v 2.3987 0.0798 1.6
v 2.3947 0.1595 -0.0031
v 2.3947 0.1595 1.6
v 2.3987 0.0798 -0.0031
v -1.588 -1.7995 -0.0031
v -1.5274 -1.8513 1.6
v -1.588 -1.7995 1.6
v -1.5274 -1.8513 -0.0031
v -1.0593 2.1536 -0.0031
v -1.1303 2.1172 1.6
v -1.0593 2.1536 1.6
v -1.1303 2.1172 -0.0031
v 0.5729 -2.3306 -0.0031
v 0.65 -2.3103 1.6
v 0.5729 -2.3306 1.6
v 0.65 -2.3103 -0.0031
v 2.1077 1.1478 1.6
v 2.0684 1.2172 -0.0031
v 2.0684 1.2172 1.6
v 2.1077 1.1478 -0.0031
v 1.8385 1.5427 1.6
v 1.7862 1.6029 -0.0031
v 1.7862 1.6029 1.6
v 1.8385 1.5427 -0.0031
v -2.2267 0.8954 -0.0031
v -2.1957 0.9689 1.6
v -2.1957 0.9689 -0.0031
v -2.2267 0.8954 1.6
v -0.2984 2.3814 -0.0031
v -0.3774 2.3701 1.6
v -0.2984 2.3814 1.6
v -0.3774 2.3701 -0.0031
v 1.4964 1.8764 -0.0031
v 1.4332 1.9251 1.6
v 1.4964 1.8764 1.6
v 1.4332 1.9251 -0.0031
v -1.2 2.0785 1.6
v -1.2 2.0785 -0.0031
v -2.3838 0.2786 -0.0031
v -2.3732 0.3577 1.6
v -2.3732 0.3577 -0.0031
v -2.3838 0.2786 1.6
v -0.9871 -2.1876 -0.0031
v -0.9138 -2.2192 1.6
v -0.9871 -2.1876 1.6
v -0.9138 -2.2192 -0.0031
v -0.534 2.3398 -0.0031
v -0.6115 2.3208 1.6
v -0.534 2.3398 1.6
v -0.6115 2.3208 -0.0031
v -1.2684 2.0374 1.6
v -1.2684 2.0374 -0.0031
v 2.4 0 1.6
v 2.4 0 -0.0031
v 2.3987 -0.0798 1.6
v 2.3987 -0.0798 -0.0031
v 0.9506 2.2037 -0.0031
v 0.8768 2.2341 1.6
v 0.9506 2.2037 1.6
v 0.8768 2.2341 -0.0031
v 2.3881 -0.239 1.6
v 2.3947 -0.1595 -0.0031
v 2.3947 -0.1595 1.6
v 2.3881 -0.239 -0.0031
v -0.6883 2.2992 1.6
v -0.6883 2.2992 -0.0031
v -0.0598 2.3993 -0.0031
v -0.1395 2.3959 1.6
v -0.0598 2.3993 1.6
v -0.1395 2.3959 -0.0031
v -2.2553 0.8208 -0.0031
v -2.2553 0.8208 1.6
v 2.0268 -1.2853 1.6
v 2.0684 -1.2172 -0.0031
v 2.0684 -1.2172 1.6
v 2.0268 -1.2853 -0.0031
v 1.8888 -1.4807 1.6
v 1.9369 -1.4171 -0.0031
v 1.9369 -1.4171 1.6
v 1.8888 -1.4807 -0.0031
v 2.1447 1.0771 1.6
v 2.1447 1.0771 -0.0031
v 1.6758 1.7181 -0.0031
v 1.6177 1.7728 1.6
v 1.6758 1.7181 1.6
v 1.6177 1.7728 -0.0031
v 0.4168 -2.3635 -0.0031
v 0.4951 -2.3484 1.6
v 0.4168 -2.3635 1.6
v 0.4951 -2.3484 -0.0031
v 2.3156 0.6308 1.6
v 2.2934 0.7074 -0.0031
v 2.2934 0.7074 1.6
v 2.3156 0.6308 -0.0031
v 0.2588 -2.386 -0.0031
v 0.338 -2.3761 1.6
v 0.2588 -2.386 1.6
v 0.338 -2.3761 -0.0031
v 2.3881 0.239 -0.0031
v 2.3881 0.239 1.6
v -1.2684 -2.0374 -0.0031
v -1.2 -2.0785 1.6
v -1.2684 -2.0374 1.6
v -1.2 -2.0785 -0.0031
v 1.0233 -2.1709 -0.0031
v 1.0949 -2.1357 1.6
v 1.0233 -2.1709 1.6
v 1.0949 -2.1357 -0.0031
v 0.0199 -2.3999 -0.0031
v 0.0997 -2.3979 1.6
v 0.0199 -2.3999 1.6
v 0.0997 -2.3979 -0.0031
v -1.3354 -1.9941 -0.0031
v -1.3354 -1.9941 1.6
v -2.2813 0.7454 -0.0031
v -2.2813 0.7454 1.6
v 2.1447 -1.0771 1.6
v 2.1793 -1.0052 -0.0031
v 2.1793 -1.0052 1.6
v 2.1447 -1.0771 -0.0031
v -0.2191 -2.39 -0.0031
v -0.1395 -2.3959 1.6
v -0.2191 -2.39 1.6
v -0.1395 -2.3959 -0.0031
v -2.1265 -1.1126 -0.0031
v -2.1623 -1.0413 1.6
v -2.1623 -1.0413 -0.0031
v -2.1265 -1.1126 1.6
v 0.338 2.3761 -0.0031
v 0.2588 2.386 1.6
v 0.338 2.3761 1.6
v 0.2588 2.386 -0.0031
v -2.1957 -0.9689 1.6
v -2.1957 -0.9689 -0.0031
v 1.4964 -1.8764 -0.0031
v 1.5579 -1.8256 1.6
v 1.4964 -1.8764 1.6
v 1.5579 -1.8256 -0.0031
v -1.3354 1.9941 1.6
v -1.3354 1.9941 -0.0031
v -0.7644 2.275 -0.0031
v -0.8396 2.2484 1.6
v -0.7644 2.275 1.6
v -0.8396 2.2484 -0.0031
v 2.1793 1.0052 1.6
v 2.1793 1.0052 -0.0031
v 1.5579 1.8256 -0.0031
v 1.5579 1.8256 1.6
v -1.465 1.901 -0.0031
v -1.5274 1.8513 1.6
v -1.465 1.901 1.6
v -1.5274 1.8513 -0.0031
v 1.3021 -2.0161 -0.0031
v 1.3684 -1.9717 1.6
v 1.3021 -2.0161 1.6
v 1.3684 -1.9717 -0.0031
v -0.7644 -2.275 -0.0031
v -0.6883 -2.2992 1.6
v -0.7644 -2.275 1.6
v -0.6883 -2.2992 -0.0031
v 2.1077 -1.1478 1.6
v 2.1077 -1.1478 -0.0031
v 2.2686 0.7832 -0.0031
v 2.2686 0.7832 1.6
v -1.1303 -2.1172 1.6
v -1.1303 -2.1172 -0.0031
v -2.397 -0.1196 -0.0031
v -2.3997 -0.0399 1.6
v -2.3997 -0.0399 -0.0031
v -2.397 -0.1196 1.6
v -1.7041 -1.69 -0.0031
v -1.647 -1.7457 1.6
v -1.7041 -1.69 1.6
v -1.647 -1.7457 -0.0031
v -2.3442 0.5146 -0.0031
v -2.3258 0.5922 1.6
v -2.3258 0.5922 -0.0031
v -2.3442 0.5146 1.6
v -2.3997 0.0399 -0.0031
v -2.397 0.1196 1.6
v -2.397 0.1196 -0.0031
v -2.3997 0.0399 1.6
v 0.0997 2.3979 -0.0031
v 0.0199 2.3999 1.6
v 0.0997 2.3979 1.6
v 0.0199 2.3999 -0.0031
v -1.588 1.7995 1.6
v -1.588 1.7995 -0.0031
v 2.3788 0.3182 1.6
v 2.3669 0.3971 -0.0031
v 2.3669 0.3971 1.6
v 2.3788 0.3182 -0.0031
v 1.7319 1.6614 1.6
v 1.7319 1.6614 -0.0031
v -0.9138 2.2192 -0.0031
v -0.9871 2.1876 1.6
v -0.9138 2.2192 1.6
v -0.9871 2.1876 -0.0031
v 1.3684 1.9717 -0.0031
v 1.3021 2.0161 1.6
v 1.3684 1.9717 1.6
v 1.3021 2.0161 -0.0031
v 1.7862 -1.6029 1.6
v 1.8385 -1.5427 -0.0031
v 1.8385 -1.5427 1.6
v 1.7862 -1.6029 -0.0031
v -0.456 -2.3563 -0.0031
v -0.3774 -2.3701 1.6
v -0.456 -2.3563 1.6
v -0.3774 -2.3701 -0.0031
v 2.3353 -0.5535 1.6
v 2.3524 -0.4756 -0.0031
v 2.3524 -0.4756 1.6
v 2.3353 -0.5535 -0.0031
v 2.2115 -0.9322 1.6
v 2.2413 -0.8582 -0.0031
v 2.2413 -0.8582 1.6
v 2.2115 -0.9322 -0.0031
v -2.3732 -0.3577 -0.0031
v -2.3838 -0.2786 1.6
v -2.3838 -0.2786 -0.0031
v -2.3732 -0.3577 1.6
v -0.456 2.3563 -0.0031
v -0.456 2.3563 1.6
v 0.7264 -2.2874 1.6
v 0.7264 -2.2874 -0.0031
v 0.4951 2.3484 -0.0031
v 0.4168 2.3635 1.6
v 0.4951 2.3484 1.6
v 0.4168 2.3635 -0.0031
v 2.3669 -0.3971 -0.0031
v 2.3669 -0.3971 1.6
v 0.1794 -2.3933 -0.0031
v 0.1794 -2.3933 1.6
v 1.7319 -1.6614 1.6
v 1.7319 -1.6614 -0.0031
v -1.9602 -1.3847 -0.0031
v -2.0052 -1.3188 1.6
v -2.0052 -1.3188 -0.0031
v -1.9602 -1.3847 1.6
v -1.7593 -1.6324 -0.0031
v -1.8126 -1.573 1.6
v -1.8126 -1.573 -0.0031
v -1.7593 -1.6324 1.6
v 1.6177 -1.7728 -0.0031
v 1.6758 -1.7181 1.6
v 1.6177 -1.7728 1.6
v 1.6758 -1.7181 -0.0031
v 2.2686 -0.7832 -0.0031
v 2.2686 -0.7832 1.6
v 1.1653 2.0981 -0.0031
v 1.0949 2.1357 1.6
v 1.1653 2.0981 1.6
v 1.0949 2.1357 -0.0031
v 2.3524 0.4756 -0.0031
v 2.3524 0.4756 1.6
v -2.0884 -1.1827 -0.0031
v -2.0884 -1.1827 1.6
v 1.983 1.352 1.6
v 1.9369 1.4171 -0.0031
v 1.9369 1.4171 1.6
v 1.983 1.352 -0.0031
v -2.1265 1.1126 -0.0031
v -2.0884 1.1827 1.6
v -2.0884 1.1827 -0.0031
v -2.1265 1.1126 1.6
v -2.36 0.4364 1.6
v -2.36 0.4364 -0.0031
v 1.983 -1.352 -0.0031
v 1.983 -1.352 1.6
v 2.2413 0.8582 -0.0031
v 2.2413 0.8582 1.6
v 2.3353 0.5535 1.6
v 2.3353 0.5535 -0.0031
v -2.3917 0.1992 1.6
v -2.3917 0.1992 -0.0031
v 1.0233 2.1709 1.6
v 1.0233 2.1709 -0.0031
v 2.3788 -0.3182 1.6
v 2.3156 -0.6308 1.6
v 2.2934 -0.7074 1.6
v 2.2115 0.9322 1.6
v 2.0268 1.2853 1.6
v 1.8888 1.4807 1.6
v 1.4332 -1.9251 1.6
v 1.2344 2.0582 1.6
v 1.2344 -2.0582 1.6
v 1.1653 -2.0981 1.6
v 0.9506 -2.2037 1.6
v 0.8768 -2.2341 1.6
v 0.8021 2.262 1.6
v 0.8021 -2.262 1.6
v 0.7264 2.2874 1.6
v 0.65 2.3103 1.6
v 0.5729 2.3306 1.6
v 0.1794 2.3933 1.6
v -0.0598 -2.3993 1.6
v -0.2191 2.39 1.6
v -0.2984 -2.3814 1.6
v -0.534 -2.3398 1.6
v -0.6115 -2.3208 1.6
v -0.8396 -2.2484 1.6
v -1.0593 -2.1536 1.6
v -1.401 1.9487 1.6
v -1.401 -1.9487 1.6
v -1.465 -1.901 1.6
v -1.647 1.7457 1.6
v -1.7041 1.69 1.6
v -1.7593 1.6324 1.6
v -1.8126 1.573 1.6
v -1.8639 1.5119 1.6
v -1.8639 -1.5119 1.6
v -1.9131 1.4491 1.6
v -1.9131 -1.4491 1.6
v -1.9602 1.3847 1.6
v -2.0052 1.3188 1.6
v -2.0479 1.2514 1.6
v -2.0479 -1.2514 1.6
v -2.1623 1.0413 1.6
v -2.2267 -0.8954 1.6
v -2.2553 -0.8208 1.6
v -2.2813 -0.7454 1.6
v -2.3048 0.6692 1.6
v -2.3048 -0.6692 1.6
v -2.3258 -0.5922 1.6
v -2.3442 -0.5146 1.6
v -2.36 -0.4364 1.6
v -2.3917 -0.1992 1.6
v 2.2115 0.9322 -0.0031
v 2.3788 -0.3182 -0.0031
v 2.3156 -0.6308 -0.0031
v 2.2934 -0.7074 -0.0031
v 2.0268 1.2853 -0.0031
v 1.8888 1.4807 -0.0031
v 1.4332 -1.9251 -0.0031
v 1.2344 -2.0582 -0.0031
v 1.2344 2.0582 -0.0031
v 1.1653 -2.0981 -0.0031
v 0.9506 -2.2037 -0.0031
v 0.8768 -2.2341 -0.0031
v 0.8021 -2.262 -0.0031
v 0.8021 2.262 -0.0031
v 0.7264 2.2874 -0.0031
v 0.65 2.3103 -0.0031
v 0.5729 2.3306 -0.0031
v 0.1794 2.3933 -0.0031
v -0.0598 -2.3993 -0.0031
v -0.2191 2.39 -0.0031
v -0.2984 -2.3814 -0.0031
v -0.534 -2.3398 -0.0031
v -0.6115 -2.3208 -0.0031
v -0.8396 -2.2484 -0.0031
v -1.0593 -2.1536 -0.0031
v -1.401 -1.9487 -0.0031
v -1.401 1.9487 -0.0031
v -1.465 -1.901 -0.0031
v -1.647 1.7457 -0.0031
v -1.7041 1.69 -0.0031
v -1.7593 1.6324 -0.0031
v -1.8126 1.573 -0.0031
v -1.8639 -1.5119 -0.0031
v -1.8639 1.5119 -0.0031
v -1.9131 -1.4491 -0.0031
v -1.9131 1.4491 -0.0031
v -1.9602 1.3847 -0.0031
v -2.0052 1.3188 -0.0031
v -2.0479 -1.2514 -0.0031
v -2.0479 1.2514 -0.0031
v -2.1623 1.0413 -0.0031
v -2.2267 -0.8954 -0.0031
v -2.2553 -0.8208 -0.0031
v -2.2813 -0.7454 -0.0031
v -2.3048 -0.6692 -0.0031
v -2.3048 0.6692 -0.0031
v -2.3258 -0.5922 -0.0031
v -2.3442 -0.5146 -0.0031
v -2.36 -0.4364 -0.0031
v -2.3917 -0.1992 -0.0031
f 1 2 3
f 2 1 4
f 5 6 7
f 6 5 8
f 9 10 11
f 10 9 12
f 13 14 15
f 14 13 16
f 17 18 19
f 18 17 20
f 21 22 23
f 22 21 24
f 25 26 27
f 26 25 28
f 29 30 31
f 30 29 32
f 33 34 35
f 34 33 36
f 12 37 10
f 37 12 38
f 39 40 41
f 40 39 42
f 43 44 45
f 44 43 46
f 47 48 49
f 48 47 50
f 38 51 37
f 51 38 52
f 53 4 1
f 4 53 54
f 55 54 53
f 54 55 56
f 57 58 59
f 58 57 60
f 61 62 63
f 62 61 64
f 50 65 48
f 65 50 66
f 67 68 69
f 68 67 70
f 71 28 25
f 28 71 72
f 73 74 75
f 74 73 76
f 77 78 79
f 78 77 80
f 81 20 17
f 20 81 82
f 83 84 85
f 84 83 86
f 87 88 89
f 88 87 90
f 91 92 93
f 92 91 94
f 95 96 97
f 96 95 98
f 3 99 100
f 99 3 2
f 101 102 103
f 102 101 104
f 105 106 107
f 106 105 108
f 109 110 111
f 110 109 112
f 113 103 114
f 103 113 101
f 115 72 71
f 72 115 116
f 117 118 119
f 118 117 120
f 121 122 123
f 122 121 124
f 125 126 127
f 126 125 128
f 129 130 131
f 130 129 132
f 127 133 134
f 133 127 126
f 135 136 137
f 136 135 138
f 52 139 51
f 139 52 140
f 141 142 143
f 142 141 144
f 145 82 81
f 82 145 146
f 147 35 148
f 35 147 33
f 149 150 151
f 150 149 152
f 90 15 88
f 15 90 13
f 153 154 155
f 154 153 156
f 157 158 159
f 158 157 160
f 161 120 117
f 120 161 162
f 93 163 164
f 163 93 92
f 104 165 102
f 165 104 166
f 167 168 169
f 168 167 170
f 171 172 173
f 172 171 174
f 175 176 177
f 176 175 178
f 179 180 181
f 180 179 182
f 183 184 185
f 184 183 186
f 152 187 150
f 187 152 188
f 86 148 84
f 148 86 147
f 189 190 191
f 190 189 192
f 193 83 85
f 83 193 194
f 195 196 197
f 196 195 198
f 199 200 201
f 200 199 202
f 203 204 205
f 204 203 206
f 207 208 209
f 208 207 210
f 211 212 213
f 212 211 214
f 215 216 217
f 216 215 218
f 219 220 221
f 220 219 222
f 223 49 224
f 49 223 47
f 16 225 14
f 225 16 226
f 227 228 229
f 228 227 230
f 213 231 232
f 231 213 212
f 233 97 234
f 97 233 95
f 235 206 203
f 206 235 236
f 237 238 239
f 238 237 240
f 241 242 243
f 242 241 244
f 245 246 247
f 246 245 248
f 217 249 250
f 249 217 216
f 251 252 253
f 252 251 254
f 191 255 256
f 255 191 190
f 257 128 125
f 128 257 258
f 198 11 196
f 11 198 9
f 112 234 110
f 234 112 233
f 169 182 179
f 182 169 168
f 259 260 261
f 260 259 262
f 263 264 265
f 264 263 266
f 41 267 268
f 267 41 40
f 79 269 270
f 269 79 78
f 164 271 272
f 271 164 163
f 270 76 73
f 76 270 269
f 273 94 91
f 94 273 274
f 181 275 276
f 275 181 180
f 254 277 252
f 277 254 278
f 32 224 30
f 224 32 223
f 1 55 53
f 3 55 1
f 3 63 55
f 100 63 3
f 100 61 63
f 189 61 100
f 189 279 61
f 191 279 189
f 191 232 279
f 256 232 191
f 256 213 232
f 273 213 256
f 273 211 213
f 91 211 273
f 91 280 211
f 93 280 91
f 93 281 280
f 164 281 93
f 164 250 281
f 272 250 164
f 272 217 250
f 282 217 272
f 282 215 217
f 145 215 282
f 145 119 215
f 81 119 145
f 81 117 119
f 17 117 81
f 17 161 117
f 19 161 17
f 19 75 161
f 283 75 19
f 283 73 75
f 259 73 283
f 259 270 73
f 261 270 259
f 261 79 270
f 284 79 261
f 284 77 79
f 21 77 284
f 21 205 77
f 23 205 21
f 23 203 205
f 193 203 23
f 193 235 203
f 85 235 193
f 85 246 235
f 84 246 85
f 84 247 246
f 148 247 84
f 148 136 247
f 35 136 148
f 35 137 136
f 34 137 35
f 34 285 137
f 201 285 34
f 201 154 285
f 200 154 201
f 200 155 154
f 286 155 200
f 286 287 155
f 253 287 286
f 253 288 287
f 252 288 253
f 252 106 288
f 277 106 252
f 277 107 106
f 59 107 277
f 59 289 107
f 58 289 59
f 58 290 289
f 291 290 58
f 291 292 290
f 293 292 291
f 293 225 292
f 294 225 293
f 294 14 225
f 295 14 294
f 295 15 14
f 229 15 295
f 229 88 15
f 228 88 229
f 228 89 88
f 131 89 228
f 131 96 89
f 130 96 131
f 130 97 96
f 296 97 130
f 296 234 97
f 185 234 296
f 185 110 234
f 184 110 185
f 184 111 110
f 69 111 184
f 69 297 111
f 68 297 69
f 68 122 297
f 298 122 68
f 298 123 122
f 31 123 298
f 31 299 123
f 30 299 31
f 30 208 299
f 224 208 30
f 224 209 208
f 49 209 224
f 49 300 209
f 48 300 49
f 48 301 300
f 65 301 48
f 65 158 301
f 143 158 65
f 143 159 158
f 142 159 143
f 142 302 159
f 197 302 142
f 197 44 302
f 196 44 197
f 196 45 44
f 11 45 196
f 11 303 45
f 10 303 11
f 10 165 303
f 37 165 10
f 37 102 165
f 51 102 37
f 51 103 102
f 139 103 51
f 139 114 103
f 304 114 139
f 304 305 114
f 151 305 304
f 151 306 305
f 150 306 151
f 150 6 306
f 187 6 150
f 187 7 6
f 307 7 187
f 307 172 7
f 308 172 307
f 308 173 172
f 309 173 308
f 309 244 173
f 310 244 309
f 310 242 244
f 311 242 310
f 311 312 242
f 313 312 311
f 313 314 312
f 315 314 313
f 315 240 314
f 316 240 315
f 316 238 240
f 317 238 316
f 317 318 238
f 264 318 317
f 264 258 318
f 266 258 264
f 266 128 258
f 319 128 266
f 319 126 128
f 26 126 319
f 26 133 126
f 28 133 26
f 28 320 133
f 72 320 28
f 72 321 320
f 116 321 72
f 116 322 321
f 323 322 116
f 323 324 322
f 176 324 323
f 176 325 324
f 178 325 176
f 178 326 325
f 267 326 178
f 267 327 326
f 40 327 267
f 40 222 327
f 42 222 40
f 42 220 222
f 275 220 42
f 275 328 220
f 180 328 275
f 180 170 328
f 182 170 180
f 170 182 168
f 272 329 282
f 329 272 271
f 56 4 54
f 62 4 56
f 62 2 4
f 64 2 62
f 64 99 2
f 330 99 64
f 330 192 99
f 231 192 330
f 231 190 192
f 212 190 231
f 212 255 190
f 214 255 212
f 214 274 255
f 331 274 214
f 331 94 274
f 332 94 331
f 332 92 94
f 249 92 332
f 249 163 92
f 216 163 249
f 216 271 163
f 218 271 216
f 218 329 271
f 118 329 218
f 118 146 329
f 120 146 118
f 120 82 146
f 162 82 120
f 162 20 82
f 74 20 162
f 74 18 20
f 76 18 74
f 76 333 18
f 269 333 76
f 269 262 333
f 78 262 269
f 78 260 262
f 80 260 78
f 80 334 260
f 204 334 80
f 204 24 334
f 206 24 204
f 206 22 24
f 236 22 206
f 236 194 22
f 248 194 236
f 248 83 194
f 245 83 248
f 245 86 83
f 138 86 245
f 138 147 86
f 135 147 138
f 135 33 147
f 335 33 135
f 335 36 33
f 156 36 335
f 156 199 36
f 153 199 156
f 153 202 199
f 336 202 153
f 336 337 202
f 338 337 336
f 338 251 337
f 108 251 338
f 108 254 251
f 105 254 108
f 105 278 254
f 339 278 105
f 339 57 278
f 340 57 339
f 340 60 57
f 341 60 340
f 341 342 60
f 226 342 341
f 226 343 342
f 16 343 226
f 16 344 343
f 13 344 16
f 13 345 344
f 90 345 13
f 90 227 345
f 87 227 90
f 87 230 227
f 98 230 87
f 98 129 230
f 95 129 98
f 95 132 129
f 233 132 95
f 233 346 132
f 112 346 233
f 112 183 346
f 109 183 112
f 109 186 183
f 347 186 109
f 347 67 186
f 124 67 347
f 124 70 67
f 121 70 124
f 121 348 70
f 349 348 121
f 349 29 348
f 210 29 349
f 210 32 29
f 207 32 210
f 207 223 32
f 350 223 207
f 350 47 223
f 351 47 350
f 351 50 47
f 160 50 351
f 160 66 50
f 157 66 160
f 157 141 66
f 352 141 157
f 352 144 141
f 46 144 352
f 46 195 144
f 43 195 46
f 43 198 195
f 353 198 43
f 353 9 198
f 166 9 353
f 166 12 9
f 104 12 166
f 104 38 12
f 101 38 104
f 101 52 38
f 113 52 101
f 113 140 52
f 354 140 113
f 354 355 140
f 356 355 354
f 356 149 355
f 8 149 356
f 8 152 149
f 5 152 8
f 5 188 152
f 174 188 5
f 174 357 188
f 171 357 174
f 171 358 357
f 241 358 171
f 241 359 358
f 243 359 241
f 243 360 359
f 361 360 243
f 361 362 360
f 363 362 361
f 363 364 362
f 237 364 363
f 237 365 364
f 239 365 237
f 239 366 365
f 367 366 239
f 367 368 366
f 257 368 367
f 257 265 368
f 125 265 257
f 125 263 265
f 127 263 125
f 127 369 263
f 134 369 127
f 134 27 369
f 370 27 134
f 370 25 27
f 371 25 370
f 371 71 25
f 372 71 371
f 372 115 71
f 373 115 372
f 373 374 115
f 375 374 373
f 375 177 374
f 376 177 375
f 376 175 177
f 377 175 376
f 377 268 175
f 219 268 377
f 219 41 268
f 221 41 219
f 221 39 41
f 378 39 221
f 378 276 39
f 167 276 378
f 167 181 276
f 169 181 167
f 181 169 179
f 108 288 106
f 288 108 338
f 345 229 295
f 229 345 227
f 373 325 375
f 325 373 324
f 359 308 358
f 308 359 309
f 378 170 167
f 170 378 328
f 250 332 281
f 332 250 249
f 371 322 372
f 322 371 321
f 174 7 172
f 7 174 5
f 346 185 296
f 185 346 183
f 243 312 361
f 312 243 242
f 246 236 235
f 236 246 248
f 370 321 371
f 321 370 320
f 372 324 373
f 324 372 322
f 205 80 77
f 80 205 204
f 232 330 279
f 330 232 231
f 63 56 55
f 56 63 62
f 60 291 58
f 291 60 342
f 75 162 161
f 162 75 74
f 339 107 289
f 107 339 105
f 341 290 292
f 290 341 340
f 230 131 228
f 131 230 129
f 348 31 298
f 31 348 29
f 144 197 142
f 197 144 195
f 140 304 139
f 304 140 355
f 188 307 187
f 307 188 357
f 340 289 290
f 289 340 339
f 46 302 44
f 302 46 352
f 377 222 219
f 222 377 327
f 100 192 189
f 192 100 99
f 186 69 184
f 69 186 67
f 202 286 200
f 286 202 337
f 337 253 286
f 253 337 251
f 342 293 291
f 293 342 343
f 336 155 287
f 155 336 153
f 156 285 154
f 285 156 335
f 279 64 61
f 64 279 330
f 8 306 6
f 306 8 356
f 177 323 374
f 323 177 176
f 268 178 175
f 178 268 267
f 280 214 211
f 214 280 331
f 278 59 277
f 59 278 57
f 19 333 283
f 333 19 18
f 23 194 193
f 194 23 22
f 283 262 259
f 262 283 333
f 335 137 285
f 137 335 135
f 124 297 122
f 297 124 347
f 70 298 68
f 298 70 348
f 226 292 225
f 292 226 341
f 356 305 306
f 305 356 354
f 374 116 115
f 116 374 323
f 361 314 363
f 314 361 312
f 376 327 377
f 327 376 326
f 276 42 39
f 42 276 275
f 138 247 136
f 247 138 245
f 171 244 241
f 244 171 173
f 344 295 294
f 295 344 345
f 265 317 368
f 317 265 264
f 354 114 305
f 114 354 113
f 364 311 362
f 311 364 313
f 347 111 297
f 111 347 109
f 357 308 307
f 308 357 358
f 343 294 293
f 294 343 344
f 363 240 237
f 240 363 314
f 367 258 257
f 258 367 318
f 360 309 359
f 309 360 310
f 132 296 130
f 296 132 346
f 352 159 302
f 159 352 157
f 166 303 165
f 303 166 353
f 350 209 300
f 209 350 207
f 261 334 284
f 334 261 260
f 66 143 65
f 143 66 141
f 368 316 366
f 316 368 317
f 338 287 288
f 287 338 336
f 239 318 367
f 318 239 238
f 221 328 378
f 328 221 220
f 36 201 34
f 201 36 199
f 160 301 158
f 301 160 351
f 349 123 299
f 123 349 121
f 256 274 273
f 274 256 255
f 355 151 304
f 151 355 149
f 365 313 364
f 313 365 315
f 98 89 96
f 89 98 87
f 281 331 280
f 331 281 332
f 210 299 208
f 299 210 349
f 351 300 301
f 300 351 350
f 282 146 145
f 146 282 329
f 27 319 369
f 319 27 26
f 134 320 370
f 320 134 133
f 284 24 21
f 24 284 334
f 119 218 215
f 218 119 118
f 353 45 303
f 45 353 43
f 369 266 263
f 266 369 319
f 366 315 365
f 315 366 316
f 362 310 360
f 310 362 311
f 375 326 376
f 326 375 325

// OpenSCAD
use <../lib.scad>
use <s/3189s01.scad>
use <../p/stud.scad>
$fa=1; $fs=0.2;
function ldraw_lib__3189(realsolid=false) = [
// 0 Door  1 x  3 x  2 Left
// 0 Name: 3189.dat
// 0 Author: James Jessiman
// 0 !LDRAW_ORG Part UPDATE 2022-01
// 0 !LICENSE Licensed under CC BY 2.0 and CC BY 4.0 : see CAreadme.txt
// 
// 0 BFC CERTIFY CCW
  [0,"BFC","CERTIFY"],
  [0,"BFC","CCW"],
// 
// 0 !HISTORY 1998-06-20 [PTadmin] Official Update 1998-06
// 0 !HISTORY 2003-01-28 [sbliss] Completed header; BFC'ed
// 0 !HISTORY 2004-03-02 [PTadmin] Official Update 2004-01
// 0 !HISTORY 2007-06-24 [PTadmin] Header formatted for Contributor Agreement
// 0 !HISTORY 2008-07-01 [PTadmin] Official Update 2008-01
// 0 !HISTORY 2020-12-20 [MagFors] Subfiled to unmirror the stud logo
// 0 !HISTORY 2022-01-14 [PTadmin] Official Update 2022-01
// 
// 
// 1 16 0 0 0 1 0 0 0 1 0 0 0 1 s\3189s01.dat
  [1,16,0,0,0,1,0,0,0,1,0,0,0,1, ldraw_lib__s__3189s01(realsolid)],
// 1 16 0 0 0 0 0 -1 0 1 0 1 0 0 stud.dat
  [1,16,0,0,0,0,0,-1,0,1,0,1,0,0, ldraw_lib__stud(realsolid)],
];
module ldraw_lib__3189(step=0, col=false, unit=2/5, alt=false, line=0.2, solid=!$preview)
    makepoly(ldraw_lib__3189(solid), step=step, col=col, unit=unit, alt=alt, line=line, solid=solid);
ldraw_lib__3189(line=0.2);
